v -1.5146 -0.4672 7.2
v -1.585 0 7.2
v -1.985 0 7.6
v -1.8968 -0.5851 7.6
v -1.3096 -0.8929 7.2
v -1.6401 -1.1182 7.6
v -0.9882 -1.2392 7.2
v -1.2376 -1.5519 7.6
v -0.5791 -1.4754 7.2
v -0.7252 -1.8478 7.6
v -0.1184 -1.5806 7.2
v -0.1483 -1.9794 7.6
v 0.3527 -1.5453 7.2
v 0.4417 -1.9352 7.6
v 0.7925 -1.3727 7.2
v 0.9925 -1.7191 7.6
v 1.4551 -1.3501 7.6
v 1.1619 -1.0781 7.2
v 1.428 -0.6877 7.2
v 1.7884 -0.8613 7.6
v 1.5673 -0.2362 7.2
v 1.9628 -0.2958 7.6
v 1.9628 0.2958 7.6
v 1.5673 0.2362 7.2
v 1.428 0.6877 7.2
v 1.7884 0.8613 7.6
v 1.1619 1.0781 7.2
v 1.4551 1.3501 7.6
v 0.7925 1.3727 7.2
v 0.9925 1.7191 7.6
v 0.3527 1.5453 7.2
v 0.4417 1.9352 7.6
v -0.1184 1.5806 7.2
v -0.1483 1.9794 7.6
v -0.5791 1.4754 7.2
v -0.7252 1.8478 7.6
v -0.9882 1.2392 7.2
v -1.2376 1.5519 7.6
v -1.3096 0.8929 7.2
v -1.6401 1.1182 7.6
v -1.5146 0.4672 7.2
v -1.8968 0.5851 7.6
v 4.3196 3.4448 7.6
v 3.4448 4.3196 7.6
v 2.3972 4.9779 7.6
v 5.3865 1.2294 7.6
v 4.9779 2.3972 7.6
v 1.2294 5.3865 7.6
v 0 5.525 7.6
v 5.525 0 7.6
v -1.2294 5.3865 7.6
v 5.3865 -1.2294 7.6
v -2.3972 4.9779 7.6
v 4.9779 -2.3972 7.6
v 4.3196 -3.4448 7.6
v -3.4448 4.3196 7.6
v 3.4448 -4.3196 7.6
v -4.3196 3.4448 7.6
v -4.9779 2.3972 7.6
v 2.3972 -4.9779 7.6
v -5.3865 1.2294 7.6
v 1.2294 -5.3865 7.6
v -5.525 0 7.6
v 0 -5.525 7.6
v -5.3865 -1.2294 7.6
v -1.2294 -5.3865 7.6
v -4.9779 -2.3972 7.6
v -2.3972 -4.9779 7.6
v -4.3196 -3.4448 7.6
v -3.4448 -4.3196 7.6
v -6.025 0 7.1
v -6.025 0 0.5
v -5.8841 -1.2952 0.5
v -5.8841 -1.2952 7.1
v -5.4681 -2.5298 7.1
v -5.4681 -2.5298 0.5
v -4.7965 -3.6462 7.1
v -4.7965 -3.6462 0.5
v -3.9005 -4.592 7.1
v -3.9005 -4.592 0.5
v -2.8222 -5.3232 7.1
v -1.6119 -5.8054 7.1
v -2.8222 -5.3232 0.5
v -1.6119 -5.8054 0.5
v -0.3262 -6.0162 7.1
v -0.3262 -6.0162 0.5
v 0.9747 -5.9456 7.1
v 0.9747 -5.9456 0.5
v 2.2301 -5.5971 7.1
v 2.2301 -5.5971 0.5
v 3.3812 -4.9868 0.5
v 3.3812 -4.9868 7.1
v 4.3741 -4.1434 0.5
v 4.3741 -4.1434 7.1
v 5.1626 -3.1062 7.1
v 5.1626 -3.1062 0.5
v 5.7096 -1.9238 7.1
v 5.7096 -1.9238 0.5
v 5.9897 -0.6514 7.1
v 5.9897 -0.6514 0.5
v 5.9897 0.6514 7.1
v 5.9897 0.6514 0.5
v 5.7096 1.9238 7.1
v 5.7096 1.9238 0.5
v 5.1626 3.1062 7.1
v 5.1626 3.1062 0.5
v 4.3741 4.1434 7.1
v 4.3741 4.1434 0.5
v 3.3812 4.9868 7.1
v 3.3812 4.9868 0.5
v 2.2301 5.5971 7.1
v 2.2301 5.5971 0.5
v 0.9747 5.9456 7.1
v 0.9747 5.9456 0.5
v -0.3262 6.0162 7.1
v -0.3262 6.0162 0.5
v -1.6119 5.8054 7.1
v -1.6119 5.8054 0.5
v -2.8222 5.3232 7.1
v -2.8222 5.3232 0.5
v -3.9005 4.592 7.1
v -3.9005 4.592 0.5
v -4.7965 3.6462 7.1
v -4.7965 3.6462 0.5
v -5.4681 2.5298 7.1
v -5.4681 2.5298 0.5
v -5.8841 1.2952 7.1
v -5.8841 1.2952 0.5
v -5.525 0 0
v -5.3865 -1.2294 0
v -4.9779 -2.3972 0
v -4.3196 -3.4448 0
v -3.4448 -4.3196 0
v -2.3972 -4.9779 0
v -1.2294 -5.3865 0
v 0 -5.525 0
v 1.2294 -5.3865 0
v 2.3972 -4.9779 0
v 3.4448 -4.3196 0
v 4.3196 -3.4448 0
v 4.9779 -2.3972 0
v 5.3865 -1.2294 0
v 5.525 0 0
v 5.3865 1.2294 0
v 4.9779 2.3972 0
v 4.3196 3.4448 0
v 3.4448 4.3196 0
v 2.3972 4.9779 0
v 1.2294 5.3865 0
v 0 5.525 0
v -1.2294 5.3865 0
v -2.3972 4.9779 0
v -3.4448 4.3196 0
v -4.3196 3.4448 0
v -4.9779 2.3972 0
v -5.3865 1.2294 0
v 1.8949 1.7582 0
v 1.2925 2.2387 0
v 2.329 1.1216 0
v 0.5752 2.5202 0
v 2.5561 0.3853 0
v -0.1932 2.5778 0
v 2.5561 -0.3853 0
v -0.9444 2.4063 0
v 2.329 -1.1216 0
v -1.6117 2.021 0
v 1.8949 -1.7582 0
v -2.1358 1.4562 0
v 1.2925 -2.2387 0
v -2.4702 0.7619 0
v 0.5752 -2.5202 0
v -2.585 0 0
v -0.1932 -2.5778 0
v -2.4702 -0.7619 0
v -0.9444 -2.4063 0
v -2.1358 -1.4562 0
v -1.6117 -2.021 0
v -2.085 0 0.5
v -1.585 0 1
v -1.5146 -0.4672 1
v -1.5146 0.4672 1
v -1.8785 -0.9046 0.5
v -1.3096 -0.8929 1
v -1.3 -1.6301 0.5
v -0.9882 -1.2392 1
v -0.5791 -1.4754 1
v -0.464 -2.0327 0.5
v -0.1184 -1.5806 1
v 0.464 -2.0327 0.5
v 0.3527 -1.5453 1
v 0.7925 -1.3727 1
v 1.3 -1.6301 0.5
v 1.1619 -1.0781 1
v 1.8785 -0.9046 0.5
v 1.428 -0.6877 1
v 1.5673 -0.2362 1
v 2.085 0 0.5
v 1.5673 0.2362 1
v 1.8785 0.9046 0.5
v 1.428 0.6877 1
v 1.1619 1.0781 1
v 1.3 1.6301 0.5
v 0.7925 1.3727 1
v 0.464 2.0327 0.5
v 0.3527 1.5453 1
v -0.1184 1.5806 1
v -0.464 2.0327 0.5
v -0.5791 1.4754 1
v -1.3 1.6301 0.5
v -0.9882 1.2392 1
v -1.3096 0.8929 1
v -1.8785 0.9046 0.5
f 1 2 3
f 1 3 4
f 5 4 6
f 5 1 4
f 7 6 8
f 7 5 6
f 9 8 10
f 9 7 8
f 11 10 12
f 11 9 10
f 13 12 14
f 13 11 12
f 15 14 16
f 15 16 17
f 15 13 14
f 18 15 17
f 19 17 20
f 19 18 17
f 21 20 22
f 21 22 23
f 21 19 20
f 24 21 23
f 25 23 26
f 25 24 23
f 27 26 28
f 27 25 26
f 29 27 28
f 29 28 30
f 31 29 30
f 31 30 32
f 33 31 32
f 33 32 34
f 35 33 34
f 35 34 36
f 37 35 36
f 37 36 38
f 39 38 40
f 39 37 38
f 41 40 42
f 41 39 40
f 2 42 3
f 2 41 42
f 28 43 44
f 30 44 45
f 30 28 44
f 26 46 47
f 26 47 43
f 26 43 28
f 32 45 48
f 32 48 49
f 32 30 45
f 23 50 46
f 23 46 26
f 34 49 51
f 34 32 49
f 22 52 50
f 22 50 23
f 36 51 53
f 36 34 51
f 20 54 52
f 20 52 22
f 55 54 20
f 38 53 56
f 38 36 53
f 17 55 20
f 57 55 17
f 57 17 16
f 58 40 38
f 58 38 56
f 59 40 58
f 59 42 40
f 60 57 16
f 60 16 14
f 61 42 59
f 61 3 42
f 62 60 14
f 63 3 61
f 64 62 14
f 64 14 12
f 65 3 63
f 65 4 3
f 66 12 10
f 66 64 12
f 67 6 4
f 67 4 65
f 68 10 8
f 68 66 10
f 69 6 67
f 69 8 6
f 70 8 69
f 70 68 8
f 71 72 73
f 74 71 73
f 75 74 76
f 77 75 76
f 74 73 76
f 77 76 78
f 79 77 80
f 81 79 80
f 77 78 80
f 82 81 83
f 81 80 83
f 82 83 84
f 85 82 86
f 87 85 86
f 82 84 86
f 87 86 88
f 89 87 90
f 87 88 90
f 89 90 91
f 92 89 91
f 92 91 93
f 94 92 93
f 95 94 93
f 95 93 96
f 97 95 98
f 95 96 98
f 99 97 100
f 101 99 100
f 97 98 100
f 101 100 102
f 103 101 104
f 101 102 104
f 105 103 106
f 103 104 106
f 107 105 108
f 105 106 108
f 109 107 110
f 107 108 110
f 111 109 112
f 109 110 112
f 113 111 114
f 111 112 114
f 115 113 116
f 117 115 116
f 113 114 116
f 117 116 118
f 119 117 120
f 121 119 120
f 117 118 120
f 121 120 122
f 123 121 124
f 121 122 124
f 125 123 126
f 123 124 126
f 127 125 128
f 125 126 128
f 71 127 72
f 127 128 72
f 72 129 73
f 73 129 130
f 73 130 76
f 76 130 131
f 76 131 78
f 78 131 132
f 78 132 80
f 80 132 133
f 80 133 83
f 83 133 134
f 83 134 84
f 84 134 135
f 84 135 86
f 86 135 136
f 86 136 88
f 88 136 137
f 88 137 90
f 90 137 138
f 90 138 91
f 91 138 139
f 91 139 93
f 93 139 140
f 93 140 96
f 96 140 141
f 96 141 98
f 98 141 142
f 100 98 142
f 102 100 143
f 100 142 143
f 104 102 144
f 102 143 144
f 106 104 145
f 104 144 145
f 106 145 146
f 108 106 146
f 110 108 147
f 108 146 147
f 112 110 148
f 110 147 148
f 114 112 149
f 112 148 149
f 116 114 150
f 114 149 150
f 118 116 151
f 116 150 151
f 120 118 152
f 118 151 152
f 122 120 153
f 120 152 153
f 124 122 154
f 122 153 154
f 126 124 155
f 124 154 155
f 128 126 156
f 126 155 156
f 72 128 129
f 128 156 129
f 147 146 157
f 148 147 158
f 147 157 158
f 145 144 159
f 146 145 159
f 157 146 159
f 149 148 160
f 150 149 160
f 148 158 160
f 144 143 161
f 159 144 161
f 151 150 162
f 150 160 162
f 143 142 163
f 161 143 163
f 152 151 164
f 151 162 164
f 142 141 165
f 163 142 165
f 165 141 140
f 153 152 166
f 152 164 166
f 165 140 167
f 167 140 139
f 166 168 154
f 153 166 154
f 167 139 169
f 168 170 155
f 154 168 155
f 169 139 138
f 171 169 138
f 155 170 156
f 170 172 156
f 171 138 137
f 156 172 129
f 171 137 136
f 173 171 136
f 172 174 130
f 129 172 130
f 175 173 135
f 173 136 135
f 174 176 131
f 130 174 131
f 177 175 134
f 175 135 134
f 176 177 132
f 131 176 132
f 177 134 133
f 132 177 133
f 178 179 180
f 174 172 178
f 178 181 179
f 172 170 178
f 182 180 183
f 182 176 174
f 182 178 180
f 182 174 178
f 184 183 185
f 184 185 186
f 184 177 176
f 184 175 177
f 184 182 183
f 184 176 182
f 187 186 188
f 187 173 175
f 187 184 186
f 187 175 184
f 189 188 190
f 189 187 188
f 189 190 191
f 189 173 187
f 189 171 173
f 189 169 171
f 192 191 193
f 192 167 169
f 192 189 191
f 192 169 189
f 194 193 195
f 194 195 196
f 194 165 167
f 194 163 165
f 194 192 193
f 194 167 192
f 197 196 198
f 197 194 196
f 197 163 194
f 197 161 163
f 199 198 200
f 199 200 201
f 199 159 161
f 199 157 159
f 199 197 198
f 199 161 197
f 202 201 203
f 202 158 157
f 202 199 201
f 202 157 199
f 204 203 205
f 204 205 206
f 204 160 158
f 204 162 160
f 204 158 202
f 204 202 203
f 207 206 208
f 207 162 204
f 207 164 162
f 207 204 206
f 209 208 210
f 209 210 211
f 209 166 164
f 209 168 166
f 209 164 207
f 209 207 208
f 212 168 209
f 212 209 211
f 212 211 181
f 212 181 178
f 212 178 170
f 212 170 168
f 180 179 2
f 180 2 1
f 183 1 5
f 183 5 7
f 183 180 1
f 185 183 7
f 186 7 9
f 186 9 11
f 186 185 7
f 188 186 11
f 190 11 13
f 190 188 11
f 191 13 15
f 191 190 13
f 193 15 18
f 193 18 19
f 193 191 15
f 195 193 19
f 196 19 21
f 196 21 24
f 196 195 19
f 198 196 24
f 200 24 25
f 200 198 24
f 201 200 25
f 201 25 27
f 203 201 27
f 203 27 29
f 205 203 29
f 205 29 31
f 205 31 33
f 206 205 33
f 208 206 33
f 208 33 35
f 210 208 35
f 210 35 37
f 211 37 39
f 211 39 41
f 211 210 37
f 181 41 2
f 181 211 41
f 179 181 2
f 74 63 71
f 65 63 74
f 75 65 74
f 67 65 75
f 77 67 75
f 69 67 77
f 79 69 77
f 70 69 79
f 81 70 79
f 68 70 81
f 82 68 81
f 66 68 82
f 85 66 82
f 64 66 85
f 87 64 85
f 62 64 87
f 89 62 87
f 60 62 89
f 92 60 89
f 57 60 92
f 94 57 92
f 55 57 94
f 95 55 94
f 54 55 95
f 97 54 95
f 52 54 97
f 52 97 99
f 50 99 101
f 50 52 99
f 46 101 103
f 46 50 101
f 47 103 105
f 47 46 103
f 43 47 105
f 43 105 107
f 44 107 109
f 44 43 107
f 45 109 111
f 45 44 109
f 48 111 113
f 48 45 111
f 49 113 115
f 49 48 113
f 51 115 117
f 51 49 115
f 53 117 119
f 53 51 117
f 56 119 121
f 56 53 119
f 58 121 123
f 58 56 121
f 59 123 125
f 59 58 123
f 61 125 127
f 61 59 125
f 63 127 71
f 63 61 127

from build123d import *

# Parameters (mm, degrees)
SKETCH1_R           = 6.025
SKETCH1_R_2         = 1.585
BOSS_EXTRUDE1_DEPTH = 7.6
CHAMFER1_SIZE       = 0.5
CHAFL_N1_SIZE       = 0.4
CHAFL_N2_SIZE       = 1


with BuildPart() as part:
    # Sketch1 → Boss-Extrude1 (new body)
    with BuildSketch(Plane.XY):
        with Locations(Location((0, 0, 0), (0, 0, 180))):
            Circle(SKETCH1_R)
        with Locations(Location((0, 0, 0), (0, 0, 180))):
            Circle(SKETCH1_R_2, mode=Mode.SUBTRACT)
    extrude(amount=BOSS_EXTRUDE1_DEPTH)

    # Chamfer1
    chamfer1_edges = [part.edges().sort_by_distance(p)[0] for p in [
        (6.025, 0, 0),
        (6.025, 0, 7.6),
    ]]
    chamfer(chamfer1_edges, length=CHAMFER1_SIZE)

    # Chaflán1
    chafl_n1_edges = [part.edges().sort_by_distance(p)[0] for p in [
        (1.585, 0, 7.6),
    ]]
    chamfer(chafl_n1_edges, length=CHAFL_N1_SIZE)

    # Chaflán2
    chafl_n2_edges = [part.edges().sort_by_distance(p)[0] for p in [
        (1.585, 0, 0),
    ]]
    chamfer(chafl_n2_edges, length=CHAFL_N2_SIZE)


solid = part.part
